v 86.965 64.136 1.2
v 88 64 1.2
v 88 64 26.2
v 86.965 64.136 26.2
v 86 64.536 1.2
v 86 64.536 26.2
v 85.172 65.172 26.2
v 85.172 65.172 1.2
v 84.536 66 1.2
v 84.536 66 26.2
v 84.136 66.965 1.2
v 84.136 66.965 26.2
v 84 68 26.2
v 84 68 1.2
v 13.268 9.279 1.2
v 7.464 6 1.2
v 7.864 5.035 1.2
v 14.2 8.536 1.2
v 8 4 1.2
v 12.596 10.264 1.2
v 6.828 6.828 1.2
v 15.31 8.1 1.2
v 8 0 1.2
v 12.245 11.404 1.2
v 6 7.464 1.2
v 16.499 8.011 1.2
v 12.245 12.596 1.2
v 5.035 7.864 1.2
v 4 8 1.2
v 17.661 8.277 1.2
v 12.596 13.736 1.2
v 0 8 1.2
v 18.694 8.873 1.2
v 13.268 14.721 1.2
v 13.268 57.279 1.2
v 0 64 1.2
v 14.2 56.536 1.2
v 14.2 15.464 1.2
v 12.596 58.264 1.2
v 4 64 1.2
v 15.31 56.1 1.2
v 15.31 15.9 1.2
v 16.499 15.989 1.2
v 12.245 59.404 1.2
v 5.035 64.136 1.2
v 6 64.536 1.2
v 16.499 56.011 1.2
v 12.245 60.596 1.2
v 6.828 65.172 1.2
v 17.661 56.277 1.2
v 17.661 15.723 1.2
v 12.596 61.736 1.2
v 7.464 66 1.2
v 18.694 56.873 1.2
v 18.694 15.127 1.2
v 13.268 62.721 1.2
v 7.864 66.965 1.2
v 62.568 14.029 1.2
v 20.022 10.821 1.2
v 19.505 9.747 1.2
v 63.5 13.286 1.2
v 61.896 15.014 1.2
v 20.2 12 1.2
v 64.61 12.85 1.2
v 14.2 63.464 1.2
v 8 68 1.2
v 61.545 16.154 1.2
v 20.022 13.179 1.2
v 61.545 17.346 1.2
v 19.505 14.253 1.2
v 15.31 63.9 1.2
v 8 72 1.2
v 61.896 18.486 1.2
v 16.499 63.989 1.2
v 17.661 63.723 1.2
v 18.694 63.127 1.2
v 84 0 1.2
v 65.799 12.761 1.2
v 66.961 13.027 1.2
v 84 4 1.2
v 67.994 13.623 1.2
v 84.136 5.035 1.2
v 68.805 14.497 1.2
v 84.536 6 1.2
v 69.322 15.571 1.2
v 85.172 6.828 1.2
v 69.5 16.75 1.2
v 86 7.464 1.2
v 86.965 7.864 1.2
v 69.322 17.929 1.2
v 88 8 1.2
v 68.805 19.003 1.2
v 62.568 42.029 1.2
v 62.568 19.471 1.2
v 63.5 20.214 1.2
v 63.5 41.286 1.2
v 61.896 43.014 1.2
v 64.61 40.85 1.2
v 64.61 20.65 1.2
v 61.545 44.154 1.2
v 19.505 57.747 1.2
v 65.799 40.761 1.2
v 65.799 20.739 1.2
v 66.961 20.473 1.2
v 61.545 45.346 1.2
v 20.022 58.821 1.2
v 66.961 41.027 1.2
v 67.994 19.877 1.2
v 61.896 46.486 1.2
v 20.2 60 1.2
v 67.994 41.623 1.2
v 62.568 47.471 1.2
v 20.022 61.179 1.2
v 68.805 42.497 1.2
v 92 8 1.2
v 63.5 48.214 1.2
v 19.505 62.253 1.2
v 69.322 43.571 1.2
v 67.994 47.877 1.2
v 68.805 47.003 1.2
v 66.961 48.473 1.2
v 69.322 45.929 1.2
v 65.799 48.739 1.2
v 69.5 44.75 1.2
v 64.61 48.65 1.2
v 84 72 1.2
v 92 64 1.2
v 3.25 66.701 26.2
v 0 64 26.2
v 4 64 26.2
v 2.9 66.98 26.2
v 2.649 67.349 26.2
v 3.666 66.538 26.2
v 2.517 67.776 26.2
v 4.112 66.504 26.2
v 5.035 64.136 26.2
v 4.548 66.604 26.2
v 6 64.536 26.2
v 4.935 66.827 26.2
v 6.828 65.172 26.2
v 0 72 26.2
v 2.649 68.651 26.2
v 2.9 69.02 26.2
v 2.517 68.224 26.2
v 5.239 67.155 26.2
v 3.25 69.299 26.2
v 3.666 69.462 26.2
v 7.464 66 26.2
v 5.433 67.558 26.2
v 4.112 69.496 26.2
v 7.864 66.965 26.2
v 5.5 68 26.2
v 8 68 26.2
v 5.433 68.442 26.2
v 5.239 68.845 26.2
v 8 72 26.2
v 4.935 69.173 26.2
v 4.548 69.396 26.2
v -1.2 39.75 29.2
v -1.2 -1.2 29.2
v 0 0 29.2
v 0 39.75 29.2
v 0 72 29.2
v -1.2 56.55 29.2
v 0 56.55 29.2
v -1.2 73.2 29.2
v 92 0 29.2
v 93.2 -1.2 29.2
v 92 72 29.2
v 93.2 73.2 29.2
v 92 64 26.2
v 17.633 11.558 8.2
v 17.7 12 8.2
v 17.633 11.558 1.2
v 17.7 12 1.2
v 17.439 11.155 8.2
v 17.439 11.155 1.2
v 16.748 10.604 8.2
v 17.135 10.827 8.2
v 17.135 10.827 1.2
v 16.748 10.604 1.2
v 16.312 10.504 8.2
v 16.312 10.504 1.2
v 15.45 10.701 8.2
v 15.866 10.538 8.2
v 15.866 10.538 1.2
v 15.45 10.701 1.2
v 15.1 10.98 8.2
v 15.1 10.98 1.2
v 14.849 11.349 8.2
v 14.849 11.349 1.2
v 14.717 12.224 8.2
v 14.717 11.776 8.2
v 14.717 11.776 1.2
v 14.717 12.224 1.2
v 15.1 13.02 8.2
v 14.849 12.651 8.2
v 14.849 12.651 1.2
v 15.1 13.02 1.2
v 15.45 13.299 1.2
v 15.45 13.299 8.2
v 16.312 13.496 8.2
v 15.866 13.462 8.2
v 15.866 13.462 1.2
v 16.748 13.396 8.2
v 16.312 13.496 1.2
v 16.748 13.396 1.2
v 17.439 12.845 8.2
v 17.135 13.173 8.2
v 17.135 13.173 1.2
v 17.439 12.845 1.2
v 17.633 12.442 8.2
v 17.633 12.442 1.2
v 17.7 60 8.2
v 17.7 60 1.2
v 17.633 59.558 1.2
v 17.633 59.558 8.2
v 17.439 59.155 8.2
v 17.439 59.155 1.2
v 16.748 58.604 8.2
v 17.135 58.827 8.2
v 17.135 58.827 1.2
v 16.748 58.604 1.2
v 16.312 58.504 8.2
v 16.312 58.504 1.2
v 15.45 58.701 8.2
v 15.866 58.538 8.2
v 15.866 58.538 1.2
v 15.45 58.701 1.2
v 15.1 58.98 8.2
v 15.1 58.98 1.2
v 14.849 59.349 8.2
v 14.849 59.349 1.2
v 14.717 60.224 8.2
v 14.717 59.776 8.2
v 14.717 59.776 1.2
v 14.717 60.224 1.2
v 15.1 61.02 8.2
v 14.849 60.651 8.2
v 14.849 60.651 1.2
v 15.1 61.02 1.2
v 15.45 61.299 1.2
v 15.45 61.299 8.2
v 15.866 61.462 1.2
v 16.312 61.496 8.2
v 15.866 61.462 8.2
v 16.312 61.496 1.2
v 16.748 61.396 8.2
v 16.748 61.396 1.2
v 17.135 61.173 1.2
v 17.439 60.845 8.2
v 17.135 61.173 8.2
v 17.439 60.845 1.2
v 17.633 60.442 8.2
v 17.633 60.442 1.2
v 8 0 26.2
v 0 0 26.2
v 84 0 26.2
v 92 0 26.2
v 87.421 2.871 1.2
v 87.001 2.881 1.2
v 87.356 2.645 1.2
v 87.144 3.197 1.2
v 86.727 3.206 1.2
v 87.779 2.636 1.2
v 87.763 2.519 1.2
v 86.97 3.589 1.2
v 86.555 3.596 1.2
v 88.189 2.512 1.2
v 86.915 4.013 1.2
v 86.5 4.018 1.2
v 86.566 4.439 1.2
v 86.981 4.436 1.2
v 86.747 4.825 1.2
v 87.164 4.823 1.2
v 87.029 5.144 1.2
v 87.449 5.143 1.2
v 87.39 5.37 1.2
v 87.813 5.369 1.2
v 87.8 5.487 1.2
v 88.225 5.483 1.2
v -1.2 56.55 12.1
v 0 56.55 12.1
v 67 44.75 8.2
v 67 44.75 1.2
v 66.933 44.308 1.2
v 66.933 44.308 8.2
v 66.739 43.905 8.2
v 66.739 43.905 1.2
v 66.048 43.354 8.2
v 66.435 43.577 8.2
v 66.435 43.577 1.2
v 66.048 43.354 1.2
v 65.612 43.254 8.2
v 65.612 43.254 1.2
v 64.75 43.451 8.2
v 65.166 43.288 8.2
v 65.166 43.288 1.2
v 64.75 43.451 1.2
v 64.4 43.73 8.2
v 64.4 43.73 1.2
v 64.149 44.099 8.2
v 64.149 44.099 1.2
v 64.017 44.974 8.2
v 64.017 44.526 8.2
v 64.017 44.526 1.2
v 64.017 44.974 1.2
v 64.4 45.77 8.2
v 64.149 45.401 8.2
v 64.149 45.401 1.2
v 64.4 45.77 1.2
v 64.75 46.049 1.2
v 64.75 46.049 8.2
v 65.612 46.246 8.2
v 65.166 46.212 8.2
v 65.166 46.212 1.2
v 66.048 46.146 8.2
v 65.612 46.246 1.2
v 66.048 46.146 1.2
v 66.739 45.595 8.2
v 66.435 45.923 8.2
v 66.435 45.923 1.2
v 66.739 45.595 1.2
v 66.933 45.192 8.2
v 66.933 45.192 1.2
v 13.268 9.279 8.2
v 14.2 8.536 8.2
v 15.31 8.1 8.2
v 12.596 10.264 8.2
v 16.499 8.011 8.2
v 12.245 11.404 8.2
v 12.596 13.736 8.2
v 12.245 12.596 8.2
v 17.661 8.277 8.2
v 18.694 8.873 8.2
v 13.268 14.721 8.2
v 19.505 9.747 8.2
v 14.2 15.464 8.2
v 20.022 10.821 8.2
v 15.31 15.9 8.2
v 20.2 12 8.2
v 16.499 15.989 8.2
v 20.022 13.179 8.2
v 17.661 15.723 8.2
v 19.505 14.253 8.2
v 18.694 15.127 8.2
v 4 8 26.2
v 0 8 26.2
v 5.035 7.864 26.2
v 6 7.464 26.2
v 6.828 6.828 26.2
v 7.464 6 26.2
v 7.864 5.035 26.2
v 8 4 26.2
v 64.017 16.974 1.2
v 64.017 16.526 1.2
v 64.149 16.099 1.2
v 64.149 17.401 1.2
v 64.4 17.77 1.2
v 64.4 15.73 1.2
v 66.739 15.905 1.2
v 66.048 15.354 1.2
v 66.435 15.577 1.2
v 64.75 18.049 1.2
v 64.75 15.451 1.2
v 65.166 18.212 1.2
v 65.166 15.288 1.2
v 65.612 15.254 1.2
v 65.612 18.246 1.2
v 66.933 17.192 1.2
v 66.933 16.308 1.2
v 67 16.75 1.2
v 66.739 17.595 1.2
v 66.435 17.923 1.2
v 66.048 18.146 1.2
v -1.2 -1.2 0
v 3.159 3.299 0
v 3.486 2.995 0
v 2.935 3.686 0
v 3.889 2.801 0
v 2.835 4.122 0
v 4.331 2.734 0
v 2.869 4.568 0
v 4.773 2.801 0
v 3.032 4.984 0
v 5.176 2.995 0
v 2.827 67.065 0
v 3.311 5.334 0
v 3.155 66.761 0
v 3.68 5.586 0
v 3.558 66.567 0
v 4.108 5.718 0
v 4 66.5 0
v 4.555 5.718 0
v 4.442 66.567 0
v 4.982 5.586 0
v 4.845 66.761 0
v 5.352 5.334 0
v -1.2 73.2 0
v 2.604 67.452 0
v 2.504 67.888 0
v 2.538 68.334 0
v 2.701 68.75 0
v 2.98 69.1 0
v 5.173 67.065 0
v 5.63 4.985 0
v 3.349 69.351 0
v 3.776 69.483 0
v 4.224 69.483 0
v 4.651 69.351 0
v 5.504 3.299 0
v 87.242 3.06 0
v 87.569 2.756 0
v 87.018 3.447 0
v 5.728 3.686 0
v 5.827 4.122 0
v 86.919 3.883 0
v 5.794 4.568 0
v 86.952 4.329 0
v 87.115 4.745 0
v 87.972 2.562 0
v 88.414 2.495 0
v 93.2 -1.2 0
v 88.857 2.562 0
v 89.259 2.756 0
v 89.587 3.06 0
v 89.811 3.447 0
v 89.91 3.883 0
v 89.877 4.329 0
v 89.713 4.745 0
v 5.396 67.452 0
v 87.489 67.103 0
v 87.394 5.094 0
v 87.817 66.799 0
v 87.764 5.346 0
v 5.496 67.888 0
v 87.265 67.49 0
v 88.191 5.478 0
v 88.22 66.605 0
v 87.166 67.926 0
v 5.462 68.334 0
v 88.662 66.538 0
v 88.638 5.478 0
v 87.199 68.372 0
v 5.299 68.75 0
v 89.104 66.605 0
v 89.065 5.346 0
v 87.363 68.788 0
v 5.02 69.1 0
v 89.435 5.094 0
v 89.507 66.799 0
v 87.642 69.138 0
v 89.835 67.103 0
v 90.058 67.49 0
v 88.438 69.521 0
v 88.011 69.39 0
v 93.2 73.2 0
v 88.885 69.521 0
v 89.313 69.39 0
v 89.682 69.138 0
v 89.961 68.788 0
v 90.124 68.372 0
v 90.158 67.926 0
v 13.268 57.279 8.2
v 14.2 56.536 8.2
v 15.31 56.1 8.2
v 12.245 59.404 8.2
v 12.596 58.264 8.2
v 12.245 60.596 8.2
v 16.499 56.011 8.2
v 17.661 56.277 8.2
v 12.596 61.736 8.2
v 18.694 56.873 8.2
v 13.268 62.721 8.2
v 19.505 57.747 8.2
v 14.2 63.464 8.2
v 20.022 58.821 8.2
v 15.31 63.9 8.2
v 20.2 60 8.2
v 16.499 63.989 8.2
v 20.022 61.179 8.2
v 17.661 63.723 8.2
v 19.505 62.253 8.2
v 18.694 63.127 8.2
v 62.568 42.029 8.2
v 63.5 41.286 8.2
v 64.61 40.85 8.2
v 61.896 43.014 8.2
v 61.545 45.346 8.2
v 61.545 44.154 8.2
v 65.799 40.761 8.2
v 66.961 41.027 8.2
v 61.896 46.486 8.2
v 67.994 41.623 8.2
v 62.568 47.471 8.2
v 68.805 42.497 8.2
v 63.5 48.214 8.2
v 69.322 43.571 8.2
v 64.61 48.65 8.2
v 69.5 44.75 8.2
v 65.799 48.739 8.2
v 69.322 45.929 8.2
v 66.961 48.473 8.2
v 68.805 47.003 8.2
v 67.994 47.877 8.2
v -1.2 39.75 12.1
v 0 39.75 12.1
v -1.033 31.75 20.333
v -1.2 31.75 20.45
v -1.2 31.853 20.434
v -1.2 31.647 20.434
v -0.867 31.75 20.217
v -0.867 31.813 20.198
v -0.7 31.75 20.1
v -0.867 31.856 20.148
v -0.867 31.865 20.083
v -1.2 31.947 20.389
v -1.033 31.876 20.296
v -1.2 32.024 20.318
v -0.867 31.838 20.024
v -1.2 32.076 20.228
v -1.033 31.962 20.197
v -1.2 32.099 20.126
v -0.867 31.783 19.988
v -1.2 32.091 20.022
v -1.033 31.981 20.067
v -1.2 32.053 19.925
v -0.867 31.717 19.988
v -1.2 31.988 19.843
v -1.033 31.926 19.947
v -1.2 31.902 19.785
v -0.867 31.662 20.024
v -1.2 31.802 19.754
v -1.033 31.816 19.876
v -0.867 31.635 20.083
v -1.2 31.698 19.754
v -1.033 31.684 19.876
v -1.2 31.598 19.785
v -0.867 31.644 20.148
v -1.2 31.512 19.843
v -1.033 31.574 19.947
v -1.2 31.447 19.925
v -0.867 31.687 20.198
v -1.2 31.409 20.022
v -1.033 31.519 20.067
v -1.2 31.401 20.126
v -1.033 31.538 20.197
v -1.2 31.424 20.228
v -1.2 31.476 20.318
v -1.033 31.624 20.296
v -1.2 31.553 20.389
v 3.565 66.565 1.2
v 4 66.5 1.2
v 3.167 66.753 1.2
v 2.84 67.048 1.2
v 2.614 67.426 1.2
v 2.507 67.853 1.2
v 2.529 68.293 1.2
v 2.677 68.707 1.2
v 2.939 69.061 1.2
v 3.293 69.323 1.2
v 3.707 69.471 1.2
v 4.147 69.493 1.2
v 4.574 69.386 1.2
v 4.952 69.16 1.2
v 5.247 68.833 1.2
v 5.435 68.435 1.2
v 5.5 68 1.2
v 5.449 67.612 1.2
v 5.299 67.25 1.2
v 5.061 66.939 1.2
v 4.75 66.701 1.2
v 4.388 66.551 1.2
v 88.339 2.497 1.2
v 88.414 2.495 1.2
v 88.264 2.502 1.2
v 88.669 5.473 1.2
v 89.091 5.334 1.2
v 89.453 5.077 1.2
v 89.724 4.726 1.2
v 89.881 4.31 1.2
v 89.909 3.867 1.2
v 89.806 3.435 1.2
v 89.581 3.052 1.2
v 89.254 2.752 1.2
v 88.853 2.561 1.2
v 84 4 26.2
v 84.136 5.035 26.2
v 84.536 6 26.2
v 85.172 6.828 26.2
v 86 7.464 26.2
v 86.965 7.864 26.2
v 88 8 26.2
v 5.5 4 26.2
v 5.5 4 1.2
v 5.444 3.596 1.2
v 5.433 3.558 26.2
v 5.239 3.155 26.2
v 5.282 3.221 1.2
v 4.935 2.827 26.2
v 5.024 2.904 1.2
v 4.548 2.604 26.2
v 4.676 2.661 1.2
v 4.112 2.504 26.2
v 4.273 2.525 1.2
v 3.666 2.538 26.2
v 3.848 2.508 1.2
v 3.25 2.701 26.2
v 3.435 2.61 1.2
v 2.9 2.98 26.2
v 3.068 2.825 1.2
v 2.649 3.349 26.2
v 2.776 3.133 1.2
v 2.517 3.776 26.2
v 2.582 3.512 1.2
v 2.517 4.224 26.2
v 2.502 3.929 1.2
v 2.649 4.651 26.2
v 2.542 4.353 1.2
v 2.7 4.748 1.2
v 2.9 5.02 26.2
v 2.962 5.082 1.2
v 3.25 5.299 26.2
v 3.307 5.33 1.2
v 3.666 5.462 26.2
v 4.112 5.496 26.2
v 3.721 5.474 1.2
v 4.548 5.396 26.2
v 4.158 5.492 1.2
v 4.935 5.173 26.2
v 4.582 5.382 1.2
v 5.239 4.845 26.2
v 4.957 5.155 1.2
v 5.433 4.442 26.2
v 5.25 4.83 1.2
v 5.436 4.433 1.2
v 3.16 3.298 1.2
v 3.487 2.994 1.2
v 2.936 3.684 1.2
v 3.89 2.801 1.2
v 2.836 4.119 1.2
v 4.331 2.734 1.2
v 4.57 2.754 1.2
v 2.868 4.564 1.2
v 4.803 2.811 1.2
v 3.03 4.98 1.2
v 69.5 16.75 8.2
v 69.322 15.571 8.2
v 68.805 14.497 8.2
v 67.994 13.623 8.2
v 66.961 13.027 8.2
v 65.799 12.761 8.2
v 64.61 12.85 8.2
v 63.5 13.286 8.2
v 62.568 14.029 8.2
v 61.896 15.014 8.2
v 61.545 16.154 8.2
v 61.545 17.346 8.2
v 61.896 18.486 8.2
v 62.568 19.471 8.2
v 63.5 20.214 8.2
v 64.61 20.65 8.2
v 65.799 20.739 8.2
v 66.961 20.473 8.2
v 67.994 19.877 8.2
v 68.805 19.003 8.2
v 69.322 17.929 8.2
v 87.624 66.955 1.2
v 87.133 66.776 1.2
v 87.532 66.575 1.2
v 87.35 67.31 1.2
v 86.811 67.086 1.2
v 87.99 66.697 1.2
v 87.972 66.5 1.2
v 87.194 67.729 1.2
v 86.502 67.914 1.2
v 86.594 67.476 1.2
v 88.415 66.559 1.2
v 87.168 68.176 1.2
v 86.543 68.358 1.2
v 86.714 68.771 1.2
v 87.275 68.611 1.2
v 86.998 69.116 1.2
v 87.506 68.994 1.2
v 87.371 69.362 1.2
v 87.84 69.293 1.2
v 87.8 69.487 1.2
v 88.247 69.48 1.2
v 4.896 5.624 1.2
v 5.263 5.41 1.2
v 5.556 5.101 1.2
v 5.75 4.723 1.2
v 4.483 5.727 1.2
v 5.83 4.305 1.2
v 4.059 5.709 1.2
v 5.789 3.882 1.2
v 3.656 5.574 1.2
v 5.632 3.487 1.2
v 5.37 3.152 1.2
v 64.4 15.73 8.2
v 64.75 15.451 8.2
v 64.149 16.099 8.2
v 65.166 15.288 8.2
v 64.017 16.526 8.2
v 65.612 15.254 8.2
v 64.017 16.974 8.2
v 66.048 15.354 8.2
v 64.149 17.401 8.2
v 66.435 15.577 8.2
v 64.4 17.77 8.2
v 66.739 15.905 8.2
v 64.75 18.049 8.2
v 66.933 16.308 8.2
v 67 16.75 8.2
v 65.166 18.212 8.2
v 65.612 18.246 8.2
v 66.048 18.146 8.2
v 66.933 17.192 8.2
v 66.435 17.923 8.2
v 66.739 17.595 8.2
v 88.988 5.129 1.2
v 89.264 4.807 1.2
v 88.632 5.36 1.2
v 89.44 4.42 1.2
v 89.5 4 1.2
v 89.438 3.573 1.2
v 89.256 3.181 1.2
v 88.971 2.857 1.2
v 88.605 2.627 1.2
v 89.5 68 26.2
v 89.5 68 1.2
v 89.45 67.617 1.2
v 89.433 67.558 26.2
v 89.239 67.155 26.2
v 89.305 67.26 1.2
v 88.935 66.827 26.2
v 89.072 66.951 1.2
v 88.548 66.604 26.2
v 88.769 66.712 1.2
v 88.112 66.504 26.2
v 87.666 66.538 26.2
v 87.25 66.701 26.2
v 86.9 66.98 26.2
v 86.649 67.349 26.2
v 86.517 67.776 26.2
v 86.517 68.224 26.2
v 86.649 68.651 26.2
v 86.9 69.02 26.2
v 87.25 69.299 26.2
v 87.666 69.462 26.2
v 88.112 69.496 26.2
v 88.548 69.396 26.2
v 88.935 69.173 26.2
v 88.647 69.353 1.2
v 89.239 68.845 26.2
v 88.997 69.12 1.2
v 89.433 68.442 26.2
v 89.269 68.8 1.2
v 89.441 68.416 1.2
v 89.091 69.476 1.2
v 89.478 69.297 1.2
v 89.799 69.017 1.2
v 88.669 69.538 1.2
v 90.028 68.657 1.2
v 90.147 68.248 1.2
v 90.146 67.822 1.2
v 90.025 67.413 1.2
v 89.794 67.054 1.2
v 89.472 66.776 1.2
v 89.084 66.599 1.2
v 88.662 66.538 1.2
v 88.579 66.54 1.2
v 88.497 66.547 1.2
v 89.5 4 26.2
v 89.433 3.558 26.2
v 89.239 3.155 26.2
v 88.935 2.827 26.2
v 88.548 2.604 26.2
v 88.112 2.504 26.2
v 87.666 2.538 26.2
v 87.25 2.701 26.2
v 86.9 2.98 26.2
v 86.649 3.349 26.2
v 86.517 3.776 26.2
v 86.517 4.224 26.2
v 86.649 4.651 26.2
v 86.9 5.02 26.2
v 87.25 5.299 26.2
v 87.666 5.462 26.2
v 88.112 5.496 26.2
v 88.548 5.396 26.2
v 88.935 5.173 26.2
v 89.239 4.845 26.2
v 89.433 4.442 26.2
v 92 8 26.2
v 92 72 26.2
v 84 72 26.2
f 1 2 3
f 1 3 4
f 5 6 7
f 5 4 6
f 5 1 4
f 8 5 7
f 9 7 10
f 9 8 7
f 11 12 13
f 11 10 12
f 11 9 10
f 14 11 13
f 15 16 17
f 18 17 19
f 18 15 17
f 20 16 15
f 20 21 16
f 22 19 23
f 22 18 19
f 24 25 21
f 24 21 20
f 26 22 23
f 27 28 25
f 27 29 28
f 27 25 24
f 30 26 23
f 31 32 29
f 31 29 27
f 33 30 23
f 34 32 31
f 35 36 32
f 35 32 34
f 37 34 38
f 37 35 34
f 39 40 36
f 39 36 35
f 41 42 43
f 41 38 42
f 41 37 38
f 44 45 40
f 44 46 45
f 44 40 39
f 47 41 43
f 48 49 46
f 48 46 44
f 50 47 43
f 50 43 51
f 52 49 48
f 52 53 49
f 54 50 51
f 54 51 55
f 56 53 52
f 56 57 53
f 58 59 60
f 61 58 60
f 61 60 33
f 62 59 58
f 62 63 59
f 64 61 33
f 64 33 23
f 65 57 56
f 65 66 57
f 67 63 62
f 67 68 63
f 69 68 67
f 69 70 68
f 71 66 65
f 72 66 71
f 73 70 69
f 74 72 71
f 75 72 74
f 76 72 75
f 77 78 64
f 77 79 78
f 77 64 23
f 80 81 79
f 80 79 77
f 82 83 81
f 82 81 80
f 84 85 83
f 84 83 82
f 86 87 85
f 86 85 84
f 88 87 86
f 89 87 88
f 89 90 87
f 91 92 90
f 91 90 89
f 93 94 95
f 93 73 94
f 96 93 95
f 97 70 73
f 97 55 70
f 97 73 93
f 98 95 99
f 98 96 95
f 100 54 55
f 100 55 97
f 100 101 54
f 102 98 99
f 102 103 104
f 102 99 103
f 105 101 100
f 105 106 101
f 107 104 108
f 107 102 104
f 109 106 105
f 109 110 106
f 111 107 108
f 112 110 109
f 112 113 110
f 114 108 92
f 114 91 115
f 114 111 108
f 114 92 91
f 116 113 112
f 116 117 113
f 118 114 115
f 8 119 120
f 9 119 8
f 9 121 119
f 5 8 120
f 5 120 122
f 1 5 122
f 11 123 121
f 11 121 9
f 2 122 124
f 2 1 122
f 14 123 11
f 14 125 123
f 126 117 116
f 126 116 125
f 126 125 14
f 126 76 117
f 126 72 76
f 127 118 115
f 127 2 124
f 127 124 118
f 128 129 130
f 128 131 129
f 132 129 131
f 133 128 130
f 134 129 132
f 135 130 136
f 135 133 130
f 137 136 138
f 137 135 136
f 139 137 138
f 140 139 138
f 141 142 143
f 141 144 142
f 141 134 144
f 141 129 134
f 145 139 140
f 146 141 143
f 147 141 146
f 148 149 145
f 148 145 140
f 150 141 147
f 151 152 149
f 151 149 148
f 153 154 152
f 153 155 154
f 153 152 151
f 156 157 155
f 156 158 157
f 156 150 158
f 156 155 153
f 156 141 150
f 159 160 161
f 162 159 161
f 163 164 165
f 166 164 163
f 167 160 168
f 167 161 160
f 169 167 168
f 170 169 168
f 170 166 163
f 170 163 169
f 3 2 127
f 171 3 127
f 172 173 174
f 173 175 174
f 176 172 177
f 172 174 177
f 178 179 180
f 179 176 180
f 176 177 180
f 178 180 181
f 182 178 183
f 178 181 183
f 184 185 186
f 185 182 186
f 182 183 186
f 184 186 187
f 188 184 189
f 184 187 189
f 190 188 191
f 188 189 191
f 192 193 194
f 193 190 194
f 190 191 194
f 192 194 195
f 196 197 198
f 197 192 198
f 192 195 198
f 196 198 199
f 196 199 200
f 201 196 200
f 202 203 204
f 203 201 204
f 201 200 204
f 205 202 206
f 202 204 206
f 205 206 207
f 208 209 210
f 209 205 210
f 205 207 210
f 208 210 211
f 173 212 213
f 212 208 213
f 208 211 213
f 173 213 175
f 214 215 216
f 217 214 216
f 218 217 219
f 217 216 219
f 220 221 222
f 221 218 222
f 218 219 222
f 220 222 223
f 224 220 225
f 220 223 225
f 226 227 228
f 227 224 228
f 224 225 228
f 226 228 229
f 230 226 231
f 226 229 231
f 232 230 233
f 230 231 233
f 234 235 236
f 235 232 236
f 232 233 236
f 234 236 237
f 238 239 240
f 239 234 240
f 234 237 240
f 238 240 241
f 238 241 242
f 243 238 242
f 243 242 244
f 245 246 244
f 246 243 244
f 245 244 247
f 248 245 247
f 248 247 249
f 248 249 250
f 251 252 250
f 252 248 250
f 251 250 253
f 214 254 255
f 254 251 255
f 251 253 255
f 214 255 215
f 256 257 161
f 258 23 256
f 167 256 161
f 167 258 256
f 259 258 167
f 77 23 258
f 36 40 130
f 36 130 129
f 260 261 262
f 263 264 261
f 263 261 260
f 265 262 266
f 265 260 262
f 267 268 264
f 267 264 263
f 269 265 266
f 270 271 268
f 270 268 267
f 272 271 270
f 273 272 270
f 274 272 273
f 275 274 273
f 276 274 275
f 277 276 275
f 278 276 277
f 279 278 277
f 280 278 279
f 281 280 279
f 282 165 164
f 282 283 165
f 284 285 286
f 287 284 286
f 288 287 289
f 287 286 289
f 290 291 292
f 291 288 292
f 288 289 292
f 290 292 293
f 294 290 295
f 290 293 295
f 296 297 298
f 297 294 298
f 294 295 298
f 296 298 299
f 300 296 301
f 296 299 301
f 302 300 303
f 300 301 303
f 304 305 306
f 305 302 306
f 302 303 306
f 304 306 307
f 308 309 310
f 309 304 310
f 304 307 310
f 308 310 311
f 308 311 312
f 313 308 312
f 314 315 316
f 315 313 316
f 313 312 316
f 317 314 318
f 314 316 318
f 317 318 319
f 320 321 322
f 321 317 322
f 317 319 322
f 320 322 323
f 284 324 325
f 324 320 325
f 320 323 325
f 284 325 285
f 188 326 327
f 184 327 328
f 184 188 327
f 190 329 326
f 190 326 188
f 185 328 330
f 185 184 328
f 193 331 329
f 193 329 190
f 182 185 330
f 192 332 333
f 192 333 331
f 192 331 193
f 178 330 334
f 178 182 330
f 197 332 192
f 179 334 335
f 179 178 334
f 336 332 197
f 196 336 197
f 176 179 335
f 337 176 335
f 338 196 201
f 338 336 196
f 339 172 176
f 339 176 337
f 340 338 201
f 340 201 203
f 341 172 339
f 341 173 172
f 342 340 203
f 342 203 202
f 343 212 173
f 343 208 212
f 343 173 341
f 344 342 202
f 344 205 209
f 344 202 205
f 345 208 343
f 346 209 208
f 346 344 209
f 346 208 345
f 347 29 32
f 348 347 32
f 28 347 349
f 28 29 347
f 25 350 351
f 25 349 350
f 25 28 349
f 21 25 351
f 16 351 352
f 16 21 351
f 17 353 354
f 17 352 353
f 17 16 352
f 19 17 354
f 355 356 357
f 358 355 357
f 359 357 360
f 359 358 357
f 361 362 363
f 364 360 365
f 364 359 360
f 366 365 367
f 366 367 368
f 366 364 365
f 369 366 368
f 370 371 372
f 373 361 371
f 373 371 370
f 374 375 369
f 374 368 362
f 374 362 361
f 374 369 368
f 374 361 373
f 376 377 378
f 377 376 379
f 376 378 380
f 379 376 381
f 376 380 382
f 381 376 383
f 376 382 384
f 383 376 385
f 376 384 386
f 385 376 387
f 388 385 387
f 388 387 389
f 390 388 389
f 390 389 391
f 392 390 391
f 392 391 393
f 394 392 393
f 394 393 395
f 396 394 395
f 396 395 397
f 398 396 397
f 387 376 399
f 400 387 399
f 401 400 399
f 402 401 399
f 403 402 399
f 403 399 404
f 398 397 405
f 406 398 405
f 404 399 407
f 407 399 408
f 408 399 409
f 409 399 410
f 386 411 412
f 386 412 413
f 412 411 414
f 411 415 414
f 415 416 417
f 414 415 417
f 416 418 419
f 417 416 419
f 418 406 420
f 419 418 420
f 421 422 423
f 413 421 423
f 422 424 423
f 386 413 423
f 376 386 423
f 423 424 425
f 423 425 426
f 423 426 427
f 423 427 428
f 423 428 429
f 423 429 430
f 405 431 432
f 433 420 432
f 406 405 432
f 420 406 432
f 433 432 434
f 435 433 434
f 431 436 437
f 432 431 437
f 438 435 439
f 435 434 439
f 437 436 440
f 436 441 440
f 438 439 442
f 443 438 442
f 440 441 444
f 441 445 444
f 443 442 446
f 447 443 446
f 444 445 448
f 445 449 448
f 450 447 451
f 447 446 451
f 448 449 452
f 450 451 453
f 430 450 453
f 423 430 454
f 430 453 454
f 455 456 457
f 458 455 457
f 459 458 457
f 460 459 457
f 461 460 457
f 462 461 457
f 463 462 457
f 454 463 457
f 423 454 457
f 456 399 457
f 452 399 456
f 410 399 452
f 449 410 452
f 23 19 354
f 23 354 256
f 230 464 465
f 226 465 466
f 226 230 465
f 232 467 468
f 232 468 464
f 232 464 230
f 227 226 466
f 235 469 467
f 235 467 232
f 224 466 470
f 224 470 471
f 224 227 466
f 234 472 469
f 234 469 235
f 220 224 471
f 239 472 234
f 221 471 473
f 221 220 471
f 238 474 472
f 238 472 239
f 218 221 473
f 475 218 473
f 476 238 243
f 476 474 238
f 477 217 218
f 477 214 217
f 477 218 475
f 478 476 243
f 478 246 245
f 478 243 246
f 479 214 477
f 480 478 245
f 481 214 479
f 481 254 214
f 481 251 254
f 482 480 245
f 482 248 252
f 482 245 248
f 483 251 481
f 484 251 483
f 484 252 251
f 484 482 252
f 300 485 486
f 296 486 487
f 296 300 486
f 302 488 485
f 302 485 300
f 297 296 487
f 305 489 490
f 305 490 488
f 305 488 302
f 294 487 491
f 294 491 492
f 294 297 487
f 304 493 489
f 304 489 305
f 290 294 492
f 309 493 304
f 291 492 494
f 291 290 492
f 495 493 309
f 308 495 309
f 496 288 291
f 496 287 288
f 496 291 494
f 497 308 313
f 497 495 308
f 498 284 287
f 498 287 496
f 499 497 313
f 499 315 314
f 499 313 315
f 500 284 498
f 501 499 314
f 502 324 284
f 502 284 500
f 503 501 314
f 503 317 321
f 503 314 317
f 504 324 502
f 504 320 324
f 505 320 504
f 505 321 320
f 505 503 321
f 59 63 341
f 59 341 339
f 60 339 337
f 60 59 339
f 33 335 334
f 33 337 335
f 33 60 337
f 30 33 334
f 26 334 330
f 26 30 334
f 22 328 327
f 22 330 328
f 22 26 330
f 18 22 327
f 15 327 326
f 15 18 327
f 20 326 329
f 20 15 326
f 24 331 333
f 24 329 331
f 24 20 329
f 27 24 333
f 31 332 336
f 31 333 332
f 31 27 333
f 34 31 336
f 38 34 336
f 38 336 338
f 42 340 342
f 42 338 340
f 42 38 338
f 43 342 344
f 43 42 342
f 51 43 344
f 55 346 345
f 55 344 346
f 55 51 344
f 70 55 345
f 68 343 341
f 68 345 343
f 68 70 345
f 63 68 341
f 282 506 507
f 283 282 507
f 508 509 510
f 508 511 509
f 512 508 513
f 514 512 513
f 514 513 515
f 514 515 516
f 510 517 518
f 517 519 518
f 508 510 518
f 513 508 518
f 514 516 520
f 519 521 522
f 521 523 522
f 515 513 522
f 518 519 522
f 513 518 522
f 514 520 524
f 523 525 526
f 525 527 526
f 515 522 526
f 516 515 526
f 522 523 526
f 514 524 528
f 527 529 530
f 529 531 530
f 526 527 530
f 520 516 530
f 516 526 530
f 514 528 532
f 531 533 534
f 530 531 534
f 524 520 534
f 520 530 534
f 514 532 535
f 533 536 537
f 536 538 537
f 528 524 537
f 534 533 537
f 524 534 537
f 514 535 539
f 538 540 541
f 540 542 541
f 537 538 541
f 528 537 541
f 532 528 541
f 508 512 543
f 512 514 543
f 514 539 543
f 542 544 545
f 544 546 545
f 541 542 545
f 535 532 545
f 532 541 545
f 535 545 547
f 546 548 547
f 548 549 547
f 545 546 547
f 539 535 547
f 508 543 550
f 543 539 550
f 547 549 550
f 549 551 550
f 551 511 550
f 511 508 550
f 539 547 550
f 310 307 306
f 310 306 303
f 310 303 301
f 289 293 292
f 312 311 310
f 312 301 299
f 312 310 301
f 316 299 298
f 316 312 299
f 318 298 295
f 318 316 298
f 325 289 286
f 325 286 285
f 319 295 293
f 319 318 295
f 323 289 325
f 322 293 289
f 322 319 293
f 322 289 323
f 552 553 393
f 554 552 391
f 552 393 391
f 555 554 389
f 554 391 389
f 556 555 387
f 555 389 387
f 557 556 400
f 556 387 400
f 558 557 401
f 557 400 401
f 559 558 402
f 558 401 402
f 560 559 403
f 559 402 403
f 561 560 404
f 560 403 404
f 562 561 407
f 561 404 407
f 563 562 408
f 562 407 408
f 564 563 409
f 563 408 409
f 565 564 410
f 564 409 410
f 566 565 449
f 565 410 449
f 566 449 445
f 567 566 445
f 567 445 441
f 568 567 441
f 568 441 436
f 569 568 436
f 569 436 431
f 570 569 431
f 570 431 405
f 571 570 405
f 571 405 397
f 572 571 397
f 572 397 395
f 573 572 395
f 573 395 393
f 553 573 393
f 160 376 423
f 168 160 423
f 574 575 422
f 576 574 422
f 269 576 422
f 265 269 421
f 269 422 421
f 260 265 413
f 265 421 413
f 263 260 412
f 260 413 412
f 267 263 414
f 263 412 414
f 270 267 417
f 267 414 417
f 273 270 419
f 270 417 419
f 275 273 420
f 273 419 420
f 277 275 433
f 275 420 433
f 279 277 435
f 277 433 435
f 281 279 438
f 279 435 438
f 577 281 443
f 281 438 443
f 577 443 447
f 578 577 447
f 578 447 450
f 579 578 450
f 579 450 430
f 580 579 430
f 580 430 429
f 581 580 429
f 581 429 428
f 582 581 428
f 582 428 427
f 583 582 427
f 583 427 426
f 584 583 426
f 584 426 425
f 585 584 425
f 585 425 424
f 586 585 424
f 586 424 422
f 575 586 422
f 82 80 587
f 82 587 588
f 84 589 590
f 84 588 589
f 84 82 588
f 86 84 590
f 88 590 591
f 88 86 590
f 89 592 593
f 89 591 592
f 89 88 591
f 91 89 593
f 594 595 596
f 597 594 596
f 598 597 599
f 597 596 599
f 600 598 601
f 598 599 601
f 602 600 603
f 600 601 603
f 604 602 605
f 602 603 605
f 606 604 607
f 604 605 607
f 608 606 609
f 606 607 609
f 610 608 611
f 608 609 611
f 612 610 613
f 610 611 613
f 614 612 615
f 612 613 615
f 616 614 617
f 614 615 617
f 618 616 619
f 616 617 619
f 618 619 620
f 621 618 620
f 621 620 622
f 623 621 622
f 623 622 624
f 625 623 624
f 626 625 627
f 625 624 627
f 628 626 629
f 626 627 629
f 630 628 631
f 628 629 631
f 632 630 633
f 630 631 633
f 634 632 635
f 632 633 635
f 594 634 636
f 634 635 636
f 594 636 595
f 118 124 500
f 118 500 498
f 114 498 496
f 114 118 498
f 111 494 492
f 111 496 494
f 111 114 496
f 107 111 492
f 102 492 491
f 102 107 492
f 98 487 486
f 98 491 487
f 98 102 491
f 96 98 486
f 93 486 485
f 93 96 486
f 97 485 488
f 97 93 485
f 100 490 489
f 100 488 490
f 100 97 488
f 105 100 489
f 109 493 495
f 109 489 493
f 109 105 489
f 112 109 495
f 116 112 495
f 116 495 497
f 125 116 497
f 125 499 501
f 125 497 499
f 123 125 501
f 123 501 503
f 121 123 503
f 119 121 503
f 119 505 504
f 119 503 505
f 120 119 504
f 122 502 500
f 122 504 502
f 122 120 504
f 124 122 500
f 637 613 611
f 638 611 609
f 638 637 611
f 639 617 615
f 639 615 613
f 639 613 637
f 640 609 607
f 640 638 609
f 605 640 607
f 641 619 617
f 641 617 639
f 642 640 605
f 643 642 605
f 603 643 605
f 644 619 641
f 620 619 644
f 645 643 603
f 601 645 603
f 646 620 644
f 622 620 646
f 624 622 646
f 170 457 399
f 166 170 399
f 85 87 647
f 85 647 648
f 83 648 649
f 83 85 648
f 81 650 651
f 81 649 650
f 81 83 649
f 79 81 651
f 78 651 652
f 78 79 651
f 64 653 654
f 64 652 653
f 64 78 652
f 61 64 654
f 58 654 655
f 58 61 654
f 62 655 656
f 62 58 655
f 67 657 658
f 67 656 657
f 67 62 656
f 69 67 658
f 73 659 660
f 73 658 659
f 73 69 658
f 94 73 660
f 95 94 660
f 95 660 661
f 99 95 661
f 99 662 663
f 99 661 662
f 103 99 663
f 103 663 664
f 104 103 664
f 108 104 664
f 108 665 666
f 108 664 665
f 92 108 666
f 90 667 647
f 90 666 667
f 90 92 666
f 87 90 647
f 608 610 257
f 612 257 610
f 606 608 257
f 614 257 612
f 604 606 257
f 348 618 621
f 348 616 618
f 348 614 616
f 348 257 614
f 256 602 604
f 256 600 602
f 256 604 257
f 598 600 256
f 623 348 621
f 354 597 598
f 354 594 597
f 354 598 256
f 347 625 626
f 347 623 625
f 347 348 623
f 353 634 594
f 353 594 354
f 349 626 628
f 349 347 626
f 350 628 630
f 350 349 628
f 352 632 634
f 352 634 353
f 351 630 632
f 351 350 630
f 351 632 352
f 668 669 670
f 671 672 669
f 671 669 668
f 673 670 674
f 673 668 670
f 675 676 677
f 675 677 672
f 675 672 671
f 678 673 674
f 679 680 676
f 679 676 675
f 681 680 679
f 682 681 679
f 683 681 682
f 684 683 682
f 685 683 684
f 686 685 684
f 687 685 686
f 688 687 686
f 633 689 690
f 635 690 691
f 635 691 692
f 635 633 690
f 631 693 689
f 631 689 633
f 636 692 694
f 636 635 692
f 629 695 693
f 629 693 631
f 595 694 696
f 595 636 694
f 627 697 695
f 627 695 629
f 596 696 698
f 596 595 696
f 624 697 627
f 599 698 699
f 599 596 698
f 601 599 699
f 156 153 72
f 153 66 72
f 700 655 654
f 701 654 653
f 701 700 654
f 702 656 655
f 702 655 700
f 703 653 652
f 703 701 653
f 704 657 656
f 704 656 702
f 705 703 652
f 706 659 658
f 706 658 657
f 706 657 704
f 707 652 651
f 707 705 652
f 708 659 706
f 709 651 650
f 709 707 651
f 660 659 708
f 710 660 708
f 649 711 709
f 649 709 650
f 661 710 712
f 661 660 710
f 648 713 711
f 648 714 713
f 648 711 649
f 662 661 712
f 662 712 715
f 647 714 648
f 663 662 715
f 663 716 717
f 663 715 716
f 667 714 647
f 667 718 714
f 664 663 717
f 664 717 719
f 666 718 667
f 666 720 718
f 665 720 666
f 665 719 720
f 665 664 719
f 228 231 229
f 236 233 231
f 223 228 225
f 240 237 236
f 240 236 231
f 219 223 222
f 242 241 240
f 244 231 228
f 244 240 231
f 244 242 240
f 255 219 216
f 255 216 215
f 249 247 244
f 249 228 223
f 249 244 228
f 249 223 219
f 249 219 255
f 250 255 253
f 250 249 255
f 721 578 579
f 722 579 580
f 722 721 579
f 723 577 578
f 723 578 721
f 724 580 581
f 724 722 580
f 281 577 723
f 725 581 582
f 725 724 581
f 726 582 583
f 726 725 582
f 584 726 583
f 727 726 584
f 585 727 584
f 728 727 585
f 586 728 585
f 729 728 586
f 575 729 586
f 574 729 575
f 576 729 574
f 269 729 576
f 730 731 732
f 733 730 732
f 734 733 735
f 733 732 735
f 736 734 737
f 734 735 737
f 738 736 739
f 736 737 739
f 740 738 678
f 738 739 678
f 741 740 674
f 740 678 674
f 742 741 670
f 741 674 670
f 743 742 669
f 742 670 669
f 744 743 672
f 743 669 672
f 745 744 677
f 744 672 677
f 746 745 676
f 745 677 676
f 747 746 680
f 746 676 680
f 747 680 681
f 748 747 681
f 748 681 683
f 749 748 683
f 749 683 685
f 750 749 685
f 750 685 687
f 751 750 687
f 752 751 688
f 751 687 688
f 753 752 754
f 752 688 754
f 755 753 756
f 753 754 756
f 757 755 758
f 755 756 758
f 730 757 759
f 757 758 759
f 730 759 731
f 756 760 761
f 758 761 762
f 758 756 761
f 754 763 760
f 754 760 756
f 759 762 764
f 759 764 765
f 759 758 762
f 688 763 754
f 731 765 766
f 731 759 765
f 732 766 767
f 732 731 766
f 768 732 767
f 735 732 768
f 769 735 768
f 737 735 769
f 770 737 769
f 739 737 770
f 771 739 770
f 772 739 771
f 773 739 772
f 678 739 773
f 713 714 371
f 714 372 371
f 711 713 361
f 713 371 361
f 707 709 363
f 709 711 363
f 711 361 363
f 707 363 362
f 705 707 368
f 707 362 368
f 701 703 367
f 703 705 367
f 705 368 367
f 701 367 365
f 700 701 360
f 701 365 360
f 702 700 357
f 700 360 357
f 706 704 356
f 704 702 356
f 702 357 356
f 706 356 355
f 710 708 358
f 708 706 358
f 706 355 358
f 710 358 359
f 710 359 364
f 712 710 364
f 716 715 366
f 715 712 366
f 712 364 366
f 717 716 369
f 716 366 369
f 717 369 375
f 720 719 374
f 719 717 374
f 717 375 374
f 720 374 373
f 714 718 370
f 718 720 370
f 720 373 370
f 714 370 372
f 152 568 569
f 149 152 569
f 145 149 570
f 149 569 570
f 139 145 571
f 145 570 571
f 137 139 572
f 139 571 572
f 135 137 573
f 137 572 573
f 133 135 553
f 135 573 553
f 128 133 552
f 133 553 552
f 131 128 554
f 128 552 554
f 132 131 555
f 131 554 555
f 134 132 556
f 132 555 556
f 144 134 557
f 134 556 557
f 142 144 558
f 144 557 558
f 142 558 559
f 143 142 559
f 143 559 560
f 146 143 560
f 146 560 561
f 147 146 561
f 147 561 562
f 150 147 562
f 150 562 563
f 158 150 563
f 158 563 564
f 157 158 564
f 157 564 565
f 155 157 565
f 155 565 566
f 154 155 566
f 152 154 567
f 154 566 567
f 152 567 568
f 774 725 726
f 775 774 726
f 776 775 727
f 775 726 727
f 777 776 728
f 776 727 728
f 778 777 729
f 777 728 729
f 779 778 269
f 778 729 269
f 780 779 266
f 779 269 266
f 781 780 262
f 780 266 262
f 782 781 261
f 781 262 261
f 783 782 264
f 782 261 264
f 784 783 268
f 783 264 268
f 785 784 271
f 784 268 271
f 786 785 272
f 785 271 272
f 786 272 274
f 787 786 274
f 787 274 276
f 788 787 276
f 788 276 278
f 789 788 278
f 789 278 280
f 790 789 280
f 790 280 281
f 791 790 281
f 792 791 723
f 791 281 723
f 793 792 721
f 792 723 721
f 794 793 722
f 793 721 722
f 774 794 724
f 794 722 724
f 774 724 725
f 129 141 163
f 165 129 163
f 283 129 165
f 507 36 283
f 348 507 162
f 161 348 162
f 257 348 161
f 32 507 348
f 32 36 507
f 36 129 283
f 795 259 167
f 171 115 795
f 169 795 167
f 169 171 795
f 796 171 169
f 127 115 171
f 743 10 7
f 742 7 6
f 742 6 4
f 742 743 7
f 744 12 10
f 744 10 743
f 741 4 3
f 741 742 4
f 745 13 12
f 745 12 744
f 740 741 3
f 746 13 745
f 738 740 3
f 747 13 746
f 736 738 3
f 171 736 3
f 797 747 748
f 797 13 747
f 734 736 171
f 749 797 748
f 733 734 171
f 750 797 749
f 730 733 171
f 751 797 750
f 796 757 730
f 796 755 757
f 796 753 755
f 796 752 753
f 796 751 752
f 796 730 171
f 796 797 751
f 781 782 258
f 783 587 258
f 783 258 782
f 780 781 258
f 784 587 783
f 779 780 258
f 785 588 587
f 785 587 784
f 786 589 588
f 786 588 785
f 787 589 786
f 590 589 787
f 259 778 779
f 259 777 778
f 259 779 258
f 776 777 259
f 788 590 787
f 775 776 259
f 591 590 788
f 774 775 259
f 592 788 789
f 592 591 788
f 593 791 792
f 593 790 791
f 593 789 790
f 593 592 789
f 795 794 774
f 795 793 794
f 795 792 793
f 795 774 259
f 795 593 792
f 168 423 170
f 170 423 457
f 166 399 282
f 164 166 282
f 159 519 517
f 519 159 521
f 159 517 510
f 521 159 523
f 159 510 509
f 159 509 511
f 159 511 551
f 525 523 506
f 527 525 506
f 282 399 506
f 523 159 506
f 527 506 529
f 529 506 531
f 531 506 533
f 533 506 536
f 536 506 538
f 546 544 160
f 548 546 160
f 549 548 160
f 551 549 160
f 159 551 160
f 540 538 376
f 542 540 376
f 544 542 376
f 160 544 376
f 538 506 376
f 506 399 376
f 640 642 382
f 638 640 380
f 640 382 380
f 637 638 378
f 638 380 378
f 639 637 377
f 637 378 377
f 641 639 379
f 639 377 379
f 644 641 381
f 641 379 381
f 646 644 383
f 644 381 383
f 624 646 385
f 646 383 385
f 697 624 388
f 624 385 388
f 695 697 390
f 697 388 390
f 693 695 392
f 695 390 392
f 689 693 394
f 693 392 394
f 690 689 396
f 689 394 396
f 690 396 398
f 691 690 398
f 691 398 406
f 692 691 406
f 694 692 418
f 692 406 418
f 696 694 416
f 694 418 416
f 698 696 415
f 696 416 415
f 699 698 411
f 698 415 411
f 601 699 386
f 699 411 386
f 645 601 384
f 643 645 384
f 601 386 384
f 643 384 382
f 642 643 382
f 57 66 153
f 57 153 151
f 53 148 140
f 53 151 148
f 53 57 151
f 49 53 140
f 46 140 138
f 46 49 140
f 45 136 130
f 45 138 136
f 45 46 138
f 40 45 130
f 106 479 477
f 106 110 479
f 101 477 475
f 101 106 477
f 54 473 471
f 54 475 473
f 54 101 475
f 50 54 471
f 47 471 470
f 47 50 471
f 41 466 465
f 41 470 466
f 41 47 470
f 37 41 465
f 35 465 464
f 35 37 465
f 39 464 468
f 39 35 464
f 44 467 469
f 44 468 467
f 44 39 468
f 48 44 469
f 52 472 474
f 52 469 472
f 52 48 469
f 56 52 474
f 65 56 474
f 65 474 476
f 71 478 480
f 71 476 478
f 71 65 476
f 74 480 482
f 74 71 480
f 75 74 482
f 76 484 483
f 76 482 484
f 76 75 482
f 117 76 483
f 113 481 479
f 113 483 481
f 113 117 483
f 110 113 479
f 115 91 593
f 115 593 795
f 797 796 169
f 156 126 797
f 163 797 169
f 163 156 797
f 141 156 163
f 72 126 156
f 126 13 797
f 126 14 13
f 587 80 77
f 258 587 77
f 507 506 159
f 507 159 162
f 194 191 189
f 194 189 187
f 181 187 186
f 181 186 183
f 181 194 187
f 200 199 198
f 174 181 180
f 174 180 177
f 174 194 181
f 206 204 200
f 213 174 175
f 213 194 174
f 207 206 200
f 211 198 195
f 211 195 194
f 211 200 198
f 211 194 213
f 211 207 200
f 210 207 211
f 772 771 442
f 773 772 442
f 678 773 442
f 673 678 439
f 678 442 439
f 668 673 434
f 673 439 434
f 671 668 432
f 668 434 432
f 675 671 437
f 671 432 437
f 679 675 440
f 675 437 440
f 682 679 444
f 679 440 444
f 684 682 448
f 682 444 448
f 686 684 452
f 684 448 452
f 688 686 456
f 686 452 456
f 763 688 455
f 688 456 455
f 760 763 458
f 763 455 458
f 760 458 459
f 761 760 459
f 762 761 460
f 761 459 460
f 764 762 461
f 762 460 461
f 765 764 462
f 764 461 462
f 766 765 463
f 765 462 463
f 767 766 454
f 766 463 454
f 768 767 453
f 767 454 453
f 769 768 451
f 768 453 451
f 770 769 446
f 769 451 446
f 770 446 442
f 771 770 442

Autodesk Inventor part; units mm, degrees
ref_plane "YZ Plane" through (0, 0, 0) normal (1, 0, 0) x (0, 1, 0)
ref_plane "XZ Plane" through (0, 0, 0) normal (0, 1, 0) x (-1, 0, 0)
sketch "Zakladna" plane through (0, 0, 0) normal (0, 0, 1) x (1, 0, 0)
  line L0 (0, 0) -> (92, 0)
  line L1 (92, 0) -> (92, 72)
  line L2 (92, 72) -> (0, 72)
  line L3 (0, 72) -> (0, 0)
  dimension "d0" = 92
  dimension "d1" = 72
extrude "Extrusion1" add sketch "Zakladna" along normal blind 1.2
sketch "Steny" plane through (0, 0, 1.2) normal (0, 0, 1) x (1, 0, 0)
  line L0 (0, 0) -> (92, 0) projected
  line L1 (0, 8) -> (0, 0)
  line L2 (0, 0) -> (8, 0)
  line L3 (0, 0) -> (8, 0)
  line L4 (0, 72) -> (8, 72)
  line L5 (0, 72) -> (8, 72)
  line L6 (92, 0) -> (92, 72) projected
  line L7 (0, 56.55) -> (-1.2, 56.55)
  line L8 (-1.2, 39.75) -> (-1.2, 0)
  line L9 (-1.2, 0) -> (-1.2, -1.2)
  line L10 (-1.2, -1.2) -> (0, -1.2)
  line L11 (0, 0) -> (0, 39.75)
  line L12 (92, 72) -> (0, 72) projected
  line L13 (0, 73.2) -> (-1.2, 73.2)
  line L14 (-1.2, 73.2) -> (-1.2, 56.55)
  line L15 (0, 72) -> (92, 72)
  line L16 (93.2, 72) -> (93.2, 73.2)
  line L17 (93.2, 73.2) -> (0, 73.2)
  line L18 (92, 72) -> (92, 0)
  line L19 (92, -1.2) -> (93.2, -1.2)
  line L20 (93.2, -1.2) -> (93.2, 72)
  line L21 (92, -1.2) -> (0, -1.2)
  line L22 (-1.2, 39.75) -> (0, 39.75)
  line L23 (0, 56.55) -> (0, 72)
  point P0 (8, 4)
  dimension "d15" = 1.2
  dimension "d16" = 16.8
  dimension "d17" = 1.2
  dimension "d18" = 1.2
  dimension "d19" = 1.2
  dimension "d20" = 1.2
  dimension "d21" = 1.2
  dimension "d23" = 1.2
sketch "Uchyt_arduino" plane through (0, 0, 1.2) normal (0, 0, 1) x (1, 0, 0)
  circle A0 centre (16.2, 12) radius 4
  circle A1 centre (16.2, 12) radius 1.5
  circle A2 centre (16.2, 60) radius 4
  circle A3 centre (16.2, 60) radius 1.5
  circle A4 centre (65.5, 44.75) radius 4
  circle A5 centre (65.5, 44.75) radius 1.5
  circle A6 centre (65.5, 16.75) radius 4
  circle A7 centre (65.5, 16.75) radius 1.5
  circle A8 centre (16.2, 12) radius 4
  circle A9 centre (16.2, 12) radius 1.5
  circle A10 centre (16.2, 60) radius 4
  circle A11 centre (16.2, 60) radius 1.5
  circle A12 centre (65.5, 44.75) radius 4
  circle A13 centre (65.5, 44.75) radius 1.5
  circle A14 centre (65.5, 16.75) radius 4
  circle A15 centre (65.5, 16.75) radius 1.5
  point P0 (0, 0)
  dimension "d31" = 8
  dimension "d32" = 3
  dimension "d33" = 8
  dimension "d34" = 3
  dimension "d35" = 8
  dimension "d36" = 3
  dimension "d37" = 8
  dimension "d38" = 3
  dimension "d39" = 8
  dimension "d40" = 3
  dimension "d41" = 8
  dimension "d42" = 3
sketch "Stena_RJ45" plane through (0, 0, 1.2) normal (0, 0, 1) x (1, 0, 0)
  line L0 (0, 56.55) -> (-1.2, 56.55) projected
  line L1 (-1.2, 39.75) -> (0, 39.75) projected
  line L2 (0, 36) -> (0, 62.75) projected
  line L3 (-1.2, 56.55) -> (-1.2, 39.75)
  line L4 (0, 39.75) -> (-1.2, 39.75)
  line L5 (0, 39.75) -> (0, 56.55)
  line L6 (0, 72) -> (0, 0) projected
sketch "Spojeni_srouby" plane through (0, 0, 1.2) normal (0, 0, 1) x (1, 0, 0)
  line L0 (8, 4) -> (8, 0) projected
  arc A0 (8, 4) -> (4, 8) centre (4, 4) ccw projected
  line L1 (4, 8) -> (0, 8) projected
  circle A1 centre (4, 4) radius 1.5 projected
  line L2 (0, 72) -> (0, 0) projected
  line L3 (0, 8) -> (0, 0)
  line L4 (0, 0) -> (8, 0)
  line L5 (0, 0) -> (92, 0)
  line L6 (92, 0) -> (92, 36)
  line L7 (92, 0) -> (92, 72)
  line L8 (8, 68) -> (8, 72)
  arc A2 (4, 64) -> (8, 68) centre (4, 68) ccw
  line L9 (4, 64) -> (0, 64)
  circle A3 centre (4, 68) radius 1.5
  line L10 (0, 0) -> (0, 72)
  line L11 (0, 64) -> (0, 72)
  line L12 (0, 72) -> (8, 72)
  line L13 (0, 72) -> (92, 72)
  line L14 (84, 4) -> (84, 0)
  arc A4 (88, 8) -> (84, 4) centre (88, 4) ccw
  line L15 (88, 8) -> (92, 8)
  circle A5 centre (88, 4) radius 1.5
  line L16 (92, 72) -> (92, 0)
  line L17 (92, 8) -> (92, 0)
  line L18 (92, 0) -> (84, 0)
  line L19 (92, 0) -> (0, 0)
  line L20 (84, 68) -> (84, 72)
  arc A6 (84, 68) -> (88, 64) centre (88, 68) ccw
  line L21 (88, 64) -> (92, 64)
  circle A7 centre (88, 68) radius 1.5
  line L22 (92, 0) -> (92, 72)
  line L23 (92, 64) -> (92, 72)
  line L24 (92, 72) -> (84, 72)
  line L25 (92, 72) -> (0, 72)
extrude "Extrusion2" add sketch "Uchyt_arduino" along normal blind 7
extrude "Extrusion3" add sketch "Steny" along normal blind 28 and the other way blind 1.2
extrude "Extrusion4" add sketch "Stena_RJ45" along normal blind 10.9 and the other way blind 1.2
extrude "Extrusion5" add sketch "Spojeni_srouby" along normal blind 25 contours L0 L4 L2 L1 A0 | L14 A4 L15 L6 L5 | L2 L12 L8 A2 L9 | L21 A6 L20 L13 L7
sketch "Sketch6" plane through (4, 4, 1.2) normal (0, 0, 1) x (1, 0, 0)
  circle A0 centre (0, 64) radius 1.5 projected
  point P0 (-4, -4)
  point P1 (0.3313, 0.2345)
  point P2 (84.6618, 64.0382)
  point P3 (84.4144, -0.0051)
hole "Hole1" at (4, 68, 1.2) at (4.3313, 4.2345, 1.2) at (88.6618, 68.0382, 1.2) at (88.4144, 3.9949, 1.2) direction (0, 0, -1) diameter 3 end through all
sketch "napajeni_znacka1" plane through (-1.2, -1.2, 0) normal (-1, 0, 0) x (0, 0, 1)
  line L0 (12.1, 57.75) -> (12.1, 40.95) projected
  line L1 (0, 0) -> (29.2, 0) projected
  circle A0 centre (20.1, 32.95) radius 0.35
  point P0 (0, 1.2)
  dimension "d65" = 0.7
ref_plane "napajeni_znacka2_rovina" through (-0.7, -1.2, 0) normal (-1, 0, 0) x (0, 0, 1)
sketch "napajeni_znacka2" plane through (-0.7, -1.2, 0) normal (-1, 0, 0) x (0, 0, 1)
  point P0 (0, 1.2)
  point P1 (20.1, 32.95)
  point P2 (20.1, 32.95)
loft "Loft1" cut profiles "napajeni_znacka1" section 2 point at (-0.7, 31.75, 20.1)
properties part number "case_bottom"
